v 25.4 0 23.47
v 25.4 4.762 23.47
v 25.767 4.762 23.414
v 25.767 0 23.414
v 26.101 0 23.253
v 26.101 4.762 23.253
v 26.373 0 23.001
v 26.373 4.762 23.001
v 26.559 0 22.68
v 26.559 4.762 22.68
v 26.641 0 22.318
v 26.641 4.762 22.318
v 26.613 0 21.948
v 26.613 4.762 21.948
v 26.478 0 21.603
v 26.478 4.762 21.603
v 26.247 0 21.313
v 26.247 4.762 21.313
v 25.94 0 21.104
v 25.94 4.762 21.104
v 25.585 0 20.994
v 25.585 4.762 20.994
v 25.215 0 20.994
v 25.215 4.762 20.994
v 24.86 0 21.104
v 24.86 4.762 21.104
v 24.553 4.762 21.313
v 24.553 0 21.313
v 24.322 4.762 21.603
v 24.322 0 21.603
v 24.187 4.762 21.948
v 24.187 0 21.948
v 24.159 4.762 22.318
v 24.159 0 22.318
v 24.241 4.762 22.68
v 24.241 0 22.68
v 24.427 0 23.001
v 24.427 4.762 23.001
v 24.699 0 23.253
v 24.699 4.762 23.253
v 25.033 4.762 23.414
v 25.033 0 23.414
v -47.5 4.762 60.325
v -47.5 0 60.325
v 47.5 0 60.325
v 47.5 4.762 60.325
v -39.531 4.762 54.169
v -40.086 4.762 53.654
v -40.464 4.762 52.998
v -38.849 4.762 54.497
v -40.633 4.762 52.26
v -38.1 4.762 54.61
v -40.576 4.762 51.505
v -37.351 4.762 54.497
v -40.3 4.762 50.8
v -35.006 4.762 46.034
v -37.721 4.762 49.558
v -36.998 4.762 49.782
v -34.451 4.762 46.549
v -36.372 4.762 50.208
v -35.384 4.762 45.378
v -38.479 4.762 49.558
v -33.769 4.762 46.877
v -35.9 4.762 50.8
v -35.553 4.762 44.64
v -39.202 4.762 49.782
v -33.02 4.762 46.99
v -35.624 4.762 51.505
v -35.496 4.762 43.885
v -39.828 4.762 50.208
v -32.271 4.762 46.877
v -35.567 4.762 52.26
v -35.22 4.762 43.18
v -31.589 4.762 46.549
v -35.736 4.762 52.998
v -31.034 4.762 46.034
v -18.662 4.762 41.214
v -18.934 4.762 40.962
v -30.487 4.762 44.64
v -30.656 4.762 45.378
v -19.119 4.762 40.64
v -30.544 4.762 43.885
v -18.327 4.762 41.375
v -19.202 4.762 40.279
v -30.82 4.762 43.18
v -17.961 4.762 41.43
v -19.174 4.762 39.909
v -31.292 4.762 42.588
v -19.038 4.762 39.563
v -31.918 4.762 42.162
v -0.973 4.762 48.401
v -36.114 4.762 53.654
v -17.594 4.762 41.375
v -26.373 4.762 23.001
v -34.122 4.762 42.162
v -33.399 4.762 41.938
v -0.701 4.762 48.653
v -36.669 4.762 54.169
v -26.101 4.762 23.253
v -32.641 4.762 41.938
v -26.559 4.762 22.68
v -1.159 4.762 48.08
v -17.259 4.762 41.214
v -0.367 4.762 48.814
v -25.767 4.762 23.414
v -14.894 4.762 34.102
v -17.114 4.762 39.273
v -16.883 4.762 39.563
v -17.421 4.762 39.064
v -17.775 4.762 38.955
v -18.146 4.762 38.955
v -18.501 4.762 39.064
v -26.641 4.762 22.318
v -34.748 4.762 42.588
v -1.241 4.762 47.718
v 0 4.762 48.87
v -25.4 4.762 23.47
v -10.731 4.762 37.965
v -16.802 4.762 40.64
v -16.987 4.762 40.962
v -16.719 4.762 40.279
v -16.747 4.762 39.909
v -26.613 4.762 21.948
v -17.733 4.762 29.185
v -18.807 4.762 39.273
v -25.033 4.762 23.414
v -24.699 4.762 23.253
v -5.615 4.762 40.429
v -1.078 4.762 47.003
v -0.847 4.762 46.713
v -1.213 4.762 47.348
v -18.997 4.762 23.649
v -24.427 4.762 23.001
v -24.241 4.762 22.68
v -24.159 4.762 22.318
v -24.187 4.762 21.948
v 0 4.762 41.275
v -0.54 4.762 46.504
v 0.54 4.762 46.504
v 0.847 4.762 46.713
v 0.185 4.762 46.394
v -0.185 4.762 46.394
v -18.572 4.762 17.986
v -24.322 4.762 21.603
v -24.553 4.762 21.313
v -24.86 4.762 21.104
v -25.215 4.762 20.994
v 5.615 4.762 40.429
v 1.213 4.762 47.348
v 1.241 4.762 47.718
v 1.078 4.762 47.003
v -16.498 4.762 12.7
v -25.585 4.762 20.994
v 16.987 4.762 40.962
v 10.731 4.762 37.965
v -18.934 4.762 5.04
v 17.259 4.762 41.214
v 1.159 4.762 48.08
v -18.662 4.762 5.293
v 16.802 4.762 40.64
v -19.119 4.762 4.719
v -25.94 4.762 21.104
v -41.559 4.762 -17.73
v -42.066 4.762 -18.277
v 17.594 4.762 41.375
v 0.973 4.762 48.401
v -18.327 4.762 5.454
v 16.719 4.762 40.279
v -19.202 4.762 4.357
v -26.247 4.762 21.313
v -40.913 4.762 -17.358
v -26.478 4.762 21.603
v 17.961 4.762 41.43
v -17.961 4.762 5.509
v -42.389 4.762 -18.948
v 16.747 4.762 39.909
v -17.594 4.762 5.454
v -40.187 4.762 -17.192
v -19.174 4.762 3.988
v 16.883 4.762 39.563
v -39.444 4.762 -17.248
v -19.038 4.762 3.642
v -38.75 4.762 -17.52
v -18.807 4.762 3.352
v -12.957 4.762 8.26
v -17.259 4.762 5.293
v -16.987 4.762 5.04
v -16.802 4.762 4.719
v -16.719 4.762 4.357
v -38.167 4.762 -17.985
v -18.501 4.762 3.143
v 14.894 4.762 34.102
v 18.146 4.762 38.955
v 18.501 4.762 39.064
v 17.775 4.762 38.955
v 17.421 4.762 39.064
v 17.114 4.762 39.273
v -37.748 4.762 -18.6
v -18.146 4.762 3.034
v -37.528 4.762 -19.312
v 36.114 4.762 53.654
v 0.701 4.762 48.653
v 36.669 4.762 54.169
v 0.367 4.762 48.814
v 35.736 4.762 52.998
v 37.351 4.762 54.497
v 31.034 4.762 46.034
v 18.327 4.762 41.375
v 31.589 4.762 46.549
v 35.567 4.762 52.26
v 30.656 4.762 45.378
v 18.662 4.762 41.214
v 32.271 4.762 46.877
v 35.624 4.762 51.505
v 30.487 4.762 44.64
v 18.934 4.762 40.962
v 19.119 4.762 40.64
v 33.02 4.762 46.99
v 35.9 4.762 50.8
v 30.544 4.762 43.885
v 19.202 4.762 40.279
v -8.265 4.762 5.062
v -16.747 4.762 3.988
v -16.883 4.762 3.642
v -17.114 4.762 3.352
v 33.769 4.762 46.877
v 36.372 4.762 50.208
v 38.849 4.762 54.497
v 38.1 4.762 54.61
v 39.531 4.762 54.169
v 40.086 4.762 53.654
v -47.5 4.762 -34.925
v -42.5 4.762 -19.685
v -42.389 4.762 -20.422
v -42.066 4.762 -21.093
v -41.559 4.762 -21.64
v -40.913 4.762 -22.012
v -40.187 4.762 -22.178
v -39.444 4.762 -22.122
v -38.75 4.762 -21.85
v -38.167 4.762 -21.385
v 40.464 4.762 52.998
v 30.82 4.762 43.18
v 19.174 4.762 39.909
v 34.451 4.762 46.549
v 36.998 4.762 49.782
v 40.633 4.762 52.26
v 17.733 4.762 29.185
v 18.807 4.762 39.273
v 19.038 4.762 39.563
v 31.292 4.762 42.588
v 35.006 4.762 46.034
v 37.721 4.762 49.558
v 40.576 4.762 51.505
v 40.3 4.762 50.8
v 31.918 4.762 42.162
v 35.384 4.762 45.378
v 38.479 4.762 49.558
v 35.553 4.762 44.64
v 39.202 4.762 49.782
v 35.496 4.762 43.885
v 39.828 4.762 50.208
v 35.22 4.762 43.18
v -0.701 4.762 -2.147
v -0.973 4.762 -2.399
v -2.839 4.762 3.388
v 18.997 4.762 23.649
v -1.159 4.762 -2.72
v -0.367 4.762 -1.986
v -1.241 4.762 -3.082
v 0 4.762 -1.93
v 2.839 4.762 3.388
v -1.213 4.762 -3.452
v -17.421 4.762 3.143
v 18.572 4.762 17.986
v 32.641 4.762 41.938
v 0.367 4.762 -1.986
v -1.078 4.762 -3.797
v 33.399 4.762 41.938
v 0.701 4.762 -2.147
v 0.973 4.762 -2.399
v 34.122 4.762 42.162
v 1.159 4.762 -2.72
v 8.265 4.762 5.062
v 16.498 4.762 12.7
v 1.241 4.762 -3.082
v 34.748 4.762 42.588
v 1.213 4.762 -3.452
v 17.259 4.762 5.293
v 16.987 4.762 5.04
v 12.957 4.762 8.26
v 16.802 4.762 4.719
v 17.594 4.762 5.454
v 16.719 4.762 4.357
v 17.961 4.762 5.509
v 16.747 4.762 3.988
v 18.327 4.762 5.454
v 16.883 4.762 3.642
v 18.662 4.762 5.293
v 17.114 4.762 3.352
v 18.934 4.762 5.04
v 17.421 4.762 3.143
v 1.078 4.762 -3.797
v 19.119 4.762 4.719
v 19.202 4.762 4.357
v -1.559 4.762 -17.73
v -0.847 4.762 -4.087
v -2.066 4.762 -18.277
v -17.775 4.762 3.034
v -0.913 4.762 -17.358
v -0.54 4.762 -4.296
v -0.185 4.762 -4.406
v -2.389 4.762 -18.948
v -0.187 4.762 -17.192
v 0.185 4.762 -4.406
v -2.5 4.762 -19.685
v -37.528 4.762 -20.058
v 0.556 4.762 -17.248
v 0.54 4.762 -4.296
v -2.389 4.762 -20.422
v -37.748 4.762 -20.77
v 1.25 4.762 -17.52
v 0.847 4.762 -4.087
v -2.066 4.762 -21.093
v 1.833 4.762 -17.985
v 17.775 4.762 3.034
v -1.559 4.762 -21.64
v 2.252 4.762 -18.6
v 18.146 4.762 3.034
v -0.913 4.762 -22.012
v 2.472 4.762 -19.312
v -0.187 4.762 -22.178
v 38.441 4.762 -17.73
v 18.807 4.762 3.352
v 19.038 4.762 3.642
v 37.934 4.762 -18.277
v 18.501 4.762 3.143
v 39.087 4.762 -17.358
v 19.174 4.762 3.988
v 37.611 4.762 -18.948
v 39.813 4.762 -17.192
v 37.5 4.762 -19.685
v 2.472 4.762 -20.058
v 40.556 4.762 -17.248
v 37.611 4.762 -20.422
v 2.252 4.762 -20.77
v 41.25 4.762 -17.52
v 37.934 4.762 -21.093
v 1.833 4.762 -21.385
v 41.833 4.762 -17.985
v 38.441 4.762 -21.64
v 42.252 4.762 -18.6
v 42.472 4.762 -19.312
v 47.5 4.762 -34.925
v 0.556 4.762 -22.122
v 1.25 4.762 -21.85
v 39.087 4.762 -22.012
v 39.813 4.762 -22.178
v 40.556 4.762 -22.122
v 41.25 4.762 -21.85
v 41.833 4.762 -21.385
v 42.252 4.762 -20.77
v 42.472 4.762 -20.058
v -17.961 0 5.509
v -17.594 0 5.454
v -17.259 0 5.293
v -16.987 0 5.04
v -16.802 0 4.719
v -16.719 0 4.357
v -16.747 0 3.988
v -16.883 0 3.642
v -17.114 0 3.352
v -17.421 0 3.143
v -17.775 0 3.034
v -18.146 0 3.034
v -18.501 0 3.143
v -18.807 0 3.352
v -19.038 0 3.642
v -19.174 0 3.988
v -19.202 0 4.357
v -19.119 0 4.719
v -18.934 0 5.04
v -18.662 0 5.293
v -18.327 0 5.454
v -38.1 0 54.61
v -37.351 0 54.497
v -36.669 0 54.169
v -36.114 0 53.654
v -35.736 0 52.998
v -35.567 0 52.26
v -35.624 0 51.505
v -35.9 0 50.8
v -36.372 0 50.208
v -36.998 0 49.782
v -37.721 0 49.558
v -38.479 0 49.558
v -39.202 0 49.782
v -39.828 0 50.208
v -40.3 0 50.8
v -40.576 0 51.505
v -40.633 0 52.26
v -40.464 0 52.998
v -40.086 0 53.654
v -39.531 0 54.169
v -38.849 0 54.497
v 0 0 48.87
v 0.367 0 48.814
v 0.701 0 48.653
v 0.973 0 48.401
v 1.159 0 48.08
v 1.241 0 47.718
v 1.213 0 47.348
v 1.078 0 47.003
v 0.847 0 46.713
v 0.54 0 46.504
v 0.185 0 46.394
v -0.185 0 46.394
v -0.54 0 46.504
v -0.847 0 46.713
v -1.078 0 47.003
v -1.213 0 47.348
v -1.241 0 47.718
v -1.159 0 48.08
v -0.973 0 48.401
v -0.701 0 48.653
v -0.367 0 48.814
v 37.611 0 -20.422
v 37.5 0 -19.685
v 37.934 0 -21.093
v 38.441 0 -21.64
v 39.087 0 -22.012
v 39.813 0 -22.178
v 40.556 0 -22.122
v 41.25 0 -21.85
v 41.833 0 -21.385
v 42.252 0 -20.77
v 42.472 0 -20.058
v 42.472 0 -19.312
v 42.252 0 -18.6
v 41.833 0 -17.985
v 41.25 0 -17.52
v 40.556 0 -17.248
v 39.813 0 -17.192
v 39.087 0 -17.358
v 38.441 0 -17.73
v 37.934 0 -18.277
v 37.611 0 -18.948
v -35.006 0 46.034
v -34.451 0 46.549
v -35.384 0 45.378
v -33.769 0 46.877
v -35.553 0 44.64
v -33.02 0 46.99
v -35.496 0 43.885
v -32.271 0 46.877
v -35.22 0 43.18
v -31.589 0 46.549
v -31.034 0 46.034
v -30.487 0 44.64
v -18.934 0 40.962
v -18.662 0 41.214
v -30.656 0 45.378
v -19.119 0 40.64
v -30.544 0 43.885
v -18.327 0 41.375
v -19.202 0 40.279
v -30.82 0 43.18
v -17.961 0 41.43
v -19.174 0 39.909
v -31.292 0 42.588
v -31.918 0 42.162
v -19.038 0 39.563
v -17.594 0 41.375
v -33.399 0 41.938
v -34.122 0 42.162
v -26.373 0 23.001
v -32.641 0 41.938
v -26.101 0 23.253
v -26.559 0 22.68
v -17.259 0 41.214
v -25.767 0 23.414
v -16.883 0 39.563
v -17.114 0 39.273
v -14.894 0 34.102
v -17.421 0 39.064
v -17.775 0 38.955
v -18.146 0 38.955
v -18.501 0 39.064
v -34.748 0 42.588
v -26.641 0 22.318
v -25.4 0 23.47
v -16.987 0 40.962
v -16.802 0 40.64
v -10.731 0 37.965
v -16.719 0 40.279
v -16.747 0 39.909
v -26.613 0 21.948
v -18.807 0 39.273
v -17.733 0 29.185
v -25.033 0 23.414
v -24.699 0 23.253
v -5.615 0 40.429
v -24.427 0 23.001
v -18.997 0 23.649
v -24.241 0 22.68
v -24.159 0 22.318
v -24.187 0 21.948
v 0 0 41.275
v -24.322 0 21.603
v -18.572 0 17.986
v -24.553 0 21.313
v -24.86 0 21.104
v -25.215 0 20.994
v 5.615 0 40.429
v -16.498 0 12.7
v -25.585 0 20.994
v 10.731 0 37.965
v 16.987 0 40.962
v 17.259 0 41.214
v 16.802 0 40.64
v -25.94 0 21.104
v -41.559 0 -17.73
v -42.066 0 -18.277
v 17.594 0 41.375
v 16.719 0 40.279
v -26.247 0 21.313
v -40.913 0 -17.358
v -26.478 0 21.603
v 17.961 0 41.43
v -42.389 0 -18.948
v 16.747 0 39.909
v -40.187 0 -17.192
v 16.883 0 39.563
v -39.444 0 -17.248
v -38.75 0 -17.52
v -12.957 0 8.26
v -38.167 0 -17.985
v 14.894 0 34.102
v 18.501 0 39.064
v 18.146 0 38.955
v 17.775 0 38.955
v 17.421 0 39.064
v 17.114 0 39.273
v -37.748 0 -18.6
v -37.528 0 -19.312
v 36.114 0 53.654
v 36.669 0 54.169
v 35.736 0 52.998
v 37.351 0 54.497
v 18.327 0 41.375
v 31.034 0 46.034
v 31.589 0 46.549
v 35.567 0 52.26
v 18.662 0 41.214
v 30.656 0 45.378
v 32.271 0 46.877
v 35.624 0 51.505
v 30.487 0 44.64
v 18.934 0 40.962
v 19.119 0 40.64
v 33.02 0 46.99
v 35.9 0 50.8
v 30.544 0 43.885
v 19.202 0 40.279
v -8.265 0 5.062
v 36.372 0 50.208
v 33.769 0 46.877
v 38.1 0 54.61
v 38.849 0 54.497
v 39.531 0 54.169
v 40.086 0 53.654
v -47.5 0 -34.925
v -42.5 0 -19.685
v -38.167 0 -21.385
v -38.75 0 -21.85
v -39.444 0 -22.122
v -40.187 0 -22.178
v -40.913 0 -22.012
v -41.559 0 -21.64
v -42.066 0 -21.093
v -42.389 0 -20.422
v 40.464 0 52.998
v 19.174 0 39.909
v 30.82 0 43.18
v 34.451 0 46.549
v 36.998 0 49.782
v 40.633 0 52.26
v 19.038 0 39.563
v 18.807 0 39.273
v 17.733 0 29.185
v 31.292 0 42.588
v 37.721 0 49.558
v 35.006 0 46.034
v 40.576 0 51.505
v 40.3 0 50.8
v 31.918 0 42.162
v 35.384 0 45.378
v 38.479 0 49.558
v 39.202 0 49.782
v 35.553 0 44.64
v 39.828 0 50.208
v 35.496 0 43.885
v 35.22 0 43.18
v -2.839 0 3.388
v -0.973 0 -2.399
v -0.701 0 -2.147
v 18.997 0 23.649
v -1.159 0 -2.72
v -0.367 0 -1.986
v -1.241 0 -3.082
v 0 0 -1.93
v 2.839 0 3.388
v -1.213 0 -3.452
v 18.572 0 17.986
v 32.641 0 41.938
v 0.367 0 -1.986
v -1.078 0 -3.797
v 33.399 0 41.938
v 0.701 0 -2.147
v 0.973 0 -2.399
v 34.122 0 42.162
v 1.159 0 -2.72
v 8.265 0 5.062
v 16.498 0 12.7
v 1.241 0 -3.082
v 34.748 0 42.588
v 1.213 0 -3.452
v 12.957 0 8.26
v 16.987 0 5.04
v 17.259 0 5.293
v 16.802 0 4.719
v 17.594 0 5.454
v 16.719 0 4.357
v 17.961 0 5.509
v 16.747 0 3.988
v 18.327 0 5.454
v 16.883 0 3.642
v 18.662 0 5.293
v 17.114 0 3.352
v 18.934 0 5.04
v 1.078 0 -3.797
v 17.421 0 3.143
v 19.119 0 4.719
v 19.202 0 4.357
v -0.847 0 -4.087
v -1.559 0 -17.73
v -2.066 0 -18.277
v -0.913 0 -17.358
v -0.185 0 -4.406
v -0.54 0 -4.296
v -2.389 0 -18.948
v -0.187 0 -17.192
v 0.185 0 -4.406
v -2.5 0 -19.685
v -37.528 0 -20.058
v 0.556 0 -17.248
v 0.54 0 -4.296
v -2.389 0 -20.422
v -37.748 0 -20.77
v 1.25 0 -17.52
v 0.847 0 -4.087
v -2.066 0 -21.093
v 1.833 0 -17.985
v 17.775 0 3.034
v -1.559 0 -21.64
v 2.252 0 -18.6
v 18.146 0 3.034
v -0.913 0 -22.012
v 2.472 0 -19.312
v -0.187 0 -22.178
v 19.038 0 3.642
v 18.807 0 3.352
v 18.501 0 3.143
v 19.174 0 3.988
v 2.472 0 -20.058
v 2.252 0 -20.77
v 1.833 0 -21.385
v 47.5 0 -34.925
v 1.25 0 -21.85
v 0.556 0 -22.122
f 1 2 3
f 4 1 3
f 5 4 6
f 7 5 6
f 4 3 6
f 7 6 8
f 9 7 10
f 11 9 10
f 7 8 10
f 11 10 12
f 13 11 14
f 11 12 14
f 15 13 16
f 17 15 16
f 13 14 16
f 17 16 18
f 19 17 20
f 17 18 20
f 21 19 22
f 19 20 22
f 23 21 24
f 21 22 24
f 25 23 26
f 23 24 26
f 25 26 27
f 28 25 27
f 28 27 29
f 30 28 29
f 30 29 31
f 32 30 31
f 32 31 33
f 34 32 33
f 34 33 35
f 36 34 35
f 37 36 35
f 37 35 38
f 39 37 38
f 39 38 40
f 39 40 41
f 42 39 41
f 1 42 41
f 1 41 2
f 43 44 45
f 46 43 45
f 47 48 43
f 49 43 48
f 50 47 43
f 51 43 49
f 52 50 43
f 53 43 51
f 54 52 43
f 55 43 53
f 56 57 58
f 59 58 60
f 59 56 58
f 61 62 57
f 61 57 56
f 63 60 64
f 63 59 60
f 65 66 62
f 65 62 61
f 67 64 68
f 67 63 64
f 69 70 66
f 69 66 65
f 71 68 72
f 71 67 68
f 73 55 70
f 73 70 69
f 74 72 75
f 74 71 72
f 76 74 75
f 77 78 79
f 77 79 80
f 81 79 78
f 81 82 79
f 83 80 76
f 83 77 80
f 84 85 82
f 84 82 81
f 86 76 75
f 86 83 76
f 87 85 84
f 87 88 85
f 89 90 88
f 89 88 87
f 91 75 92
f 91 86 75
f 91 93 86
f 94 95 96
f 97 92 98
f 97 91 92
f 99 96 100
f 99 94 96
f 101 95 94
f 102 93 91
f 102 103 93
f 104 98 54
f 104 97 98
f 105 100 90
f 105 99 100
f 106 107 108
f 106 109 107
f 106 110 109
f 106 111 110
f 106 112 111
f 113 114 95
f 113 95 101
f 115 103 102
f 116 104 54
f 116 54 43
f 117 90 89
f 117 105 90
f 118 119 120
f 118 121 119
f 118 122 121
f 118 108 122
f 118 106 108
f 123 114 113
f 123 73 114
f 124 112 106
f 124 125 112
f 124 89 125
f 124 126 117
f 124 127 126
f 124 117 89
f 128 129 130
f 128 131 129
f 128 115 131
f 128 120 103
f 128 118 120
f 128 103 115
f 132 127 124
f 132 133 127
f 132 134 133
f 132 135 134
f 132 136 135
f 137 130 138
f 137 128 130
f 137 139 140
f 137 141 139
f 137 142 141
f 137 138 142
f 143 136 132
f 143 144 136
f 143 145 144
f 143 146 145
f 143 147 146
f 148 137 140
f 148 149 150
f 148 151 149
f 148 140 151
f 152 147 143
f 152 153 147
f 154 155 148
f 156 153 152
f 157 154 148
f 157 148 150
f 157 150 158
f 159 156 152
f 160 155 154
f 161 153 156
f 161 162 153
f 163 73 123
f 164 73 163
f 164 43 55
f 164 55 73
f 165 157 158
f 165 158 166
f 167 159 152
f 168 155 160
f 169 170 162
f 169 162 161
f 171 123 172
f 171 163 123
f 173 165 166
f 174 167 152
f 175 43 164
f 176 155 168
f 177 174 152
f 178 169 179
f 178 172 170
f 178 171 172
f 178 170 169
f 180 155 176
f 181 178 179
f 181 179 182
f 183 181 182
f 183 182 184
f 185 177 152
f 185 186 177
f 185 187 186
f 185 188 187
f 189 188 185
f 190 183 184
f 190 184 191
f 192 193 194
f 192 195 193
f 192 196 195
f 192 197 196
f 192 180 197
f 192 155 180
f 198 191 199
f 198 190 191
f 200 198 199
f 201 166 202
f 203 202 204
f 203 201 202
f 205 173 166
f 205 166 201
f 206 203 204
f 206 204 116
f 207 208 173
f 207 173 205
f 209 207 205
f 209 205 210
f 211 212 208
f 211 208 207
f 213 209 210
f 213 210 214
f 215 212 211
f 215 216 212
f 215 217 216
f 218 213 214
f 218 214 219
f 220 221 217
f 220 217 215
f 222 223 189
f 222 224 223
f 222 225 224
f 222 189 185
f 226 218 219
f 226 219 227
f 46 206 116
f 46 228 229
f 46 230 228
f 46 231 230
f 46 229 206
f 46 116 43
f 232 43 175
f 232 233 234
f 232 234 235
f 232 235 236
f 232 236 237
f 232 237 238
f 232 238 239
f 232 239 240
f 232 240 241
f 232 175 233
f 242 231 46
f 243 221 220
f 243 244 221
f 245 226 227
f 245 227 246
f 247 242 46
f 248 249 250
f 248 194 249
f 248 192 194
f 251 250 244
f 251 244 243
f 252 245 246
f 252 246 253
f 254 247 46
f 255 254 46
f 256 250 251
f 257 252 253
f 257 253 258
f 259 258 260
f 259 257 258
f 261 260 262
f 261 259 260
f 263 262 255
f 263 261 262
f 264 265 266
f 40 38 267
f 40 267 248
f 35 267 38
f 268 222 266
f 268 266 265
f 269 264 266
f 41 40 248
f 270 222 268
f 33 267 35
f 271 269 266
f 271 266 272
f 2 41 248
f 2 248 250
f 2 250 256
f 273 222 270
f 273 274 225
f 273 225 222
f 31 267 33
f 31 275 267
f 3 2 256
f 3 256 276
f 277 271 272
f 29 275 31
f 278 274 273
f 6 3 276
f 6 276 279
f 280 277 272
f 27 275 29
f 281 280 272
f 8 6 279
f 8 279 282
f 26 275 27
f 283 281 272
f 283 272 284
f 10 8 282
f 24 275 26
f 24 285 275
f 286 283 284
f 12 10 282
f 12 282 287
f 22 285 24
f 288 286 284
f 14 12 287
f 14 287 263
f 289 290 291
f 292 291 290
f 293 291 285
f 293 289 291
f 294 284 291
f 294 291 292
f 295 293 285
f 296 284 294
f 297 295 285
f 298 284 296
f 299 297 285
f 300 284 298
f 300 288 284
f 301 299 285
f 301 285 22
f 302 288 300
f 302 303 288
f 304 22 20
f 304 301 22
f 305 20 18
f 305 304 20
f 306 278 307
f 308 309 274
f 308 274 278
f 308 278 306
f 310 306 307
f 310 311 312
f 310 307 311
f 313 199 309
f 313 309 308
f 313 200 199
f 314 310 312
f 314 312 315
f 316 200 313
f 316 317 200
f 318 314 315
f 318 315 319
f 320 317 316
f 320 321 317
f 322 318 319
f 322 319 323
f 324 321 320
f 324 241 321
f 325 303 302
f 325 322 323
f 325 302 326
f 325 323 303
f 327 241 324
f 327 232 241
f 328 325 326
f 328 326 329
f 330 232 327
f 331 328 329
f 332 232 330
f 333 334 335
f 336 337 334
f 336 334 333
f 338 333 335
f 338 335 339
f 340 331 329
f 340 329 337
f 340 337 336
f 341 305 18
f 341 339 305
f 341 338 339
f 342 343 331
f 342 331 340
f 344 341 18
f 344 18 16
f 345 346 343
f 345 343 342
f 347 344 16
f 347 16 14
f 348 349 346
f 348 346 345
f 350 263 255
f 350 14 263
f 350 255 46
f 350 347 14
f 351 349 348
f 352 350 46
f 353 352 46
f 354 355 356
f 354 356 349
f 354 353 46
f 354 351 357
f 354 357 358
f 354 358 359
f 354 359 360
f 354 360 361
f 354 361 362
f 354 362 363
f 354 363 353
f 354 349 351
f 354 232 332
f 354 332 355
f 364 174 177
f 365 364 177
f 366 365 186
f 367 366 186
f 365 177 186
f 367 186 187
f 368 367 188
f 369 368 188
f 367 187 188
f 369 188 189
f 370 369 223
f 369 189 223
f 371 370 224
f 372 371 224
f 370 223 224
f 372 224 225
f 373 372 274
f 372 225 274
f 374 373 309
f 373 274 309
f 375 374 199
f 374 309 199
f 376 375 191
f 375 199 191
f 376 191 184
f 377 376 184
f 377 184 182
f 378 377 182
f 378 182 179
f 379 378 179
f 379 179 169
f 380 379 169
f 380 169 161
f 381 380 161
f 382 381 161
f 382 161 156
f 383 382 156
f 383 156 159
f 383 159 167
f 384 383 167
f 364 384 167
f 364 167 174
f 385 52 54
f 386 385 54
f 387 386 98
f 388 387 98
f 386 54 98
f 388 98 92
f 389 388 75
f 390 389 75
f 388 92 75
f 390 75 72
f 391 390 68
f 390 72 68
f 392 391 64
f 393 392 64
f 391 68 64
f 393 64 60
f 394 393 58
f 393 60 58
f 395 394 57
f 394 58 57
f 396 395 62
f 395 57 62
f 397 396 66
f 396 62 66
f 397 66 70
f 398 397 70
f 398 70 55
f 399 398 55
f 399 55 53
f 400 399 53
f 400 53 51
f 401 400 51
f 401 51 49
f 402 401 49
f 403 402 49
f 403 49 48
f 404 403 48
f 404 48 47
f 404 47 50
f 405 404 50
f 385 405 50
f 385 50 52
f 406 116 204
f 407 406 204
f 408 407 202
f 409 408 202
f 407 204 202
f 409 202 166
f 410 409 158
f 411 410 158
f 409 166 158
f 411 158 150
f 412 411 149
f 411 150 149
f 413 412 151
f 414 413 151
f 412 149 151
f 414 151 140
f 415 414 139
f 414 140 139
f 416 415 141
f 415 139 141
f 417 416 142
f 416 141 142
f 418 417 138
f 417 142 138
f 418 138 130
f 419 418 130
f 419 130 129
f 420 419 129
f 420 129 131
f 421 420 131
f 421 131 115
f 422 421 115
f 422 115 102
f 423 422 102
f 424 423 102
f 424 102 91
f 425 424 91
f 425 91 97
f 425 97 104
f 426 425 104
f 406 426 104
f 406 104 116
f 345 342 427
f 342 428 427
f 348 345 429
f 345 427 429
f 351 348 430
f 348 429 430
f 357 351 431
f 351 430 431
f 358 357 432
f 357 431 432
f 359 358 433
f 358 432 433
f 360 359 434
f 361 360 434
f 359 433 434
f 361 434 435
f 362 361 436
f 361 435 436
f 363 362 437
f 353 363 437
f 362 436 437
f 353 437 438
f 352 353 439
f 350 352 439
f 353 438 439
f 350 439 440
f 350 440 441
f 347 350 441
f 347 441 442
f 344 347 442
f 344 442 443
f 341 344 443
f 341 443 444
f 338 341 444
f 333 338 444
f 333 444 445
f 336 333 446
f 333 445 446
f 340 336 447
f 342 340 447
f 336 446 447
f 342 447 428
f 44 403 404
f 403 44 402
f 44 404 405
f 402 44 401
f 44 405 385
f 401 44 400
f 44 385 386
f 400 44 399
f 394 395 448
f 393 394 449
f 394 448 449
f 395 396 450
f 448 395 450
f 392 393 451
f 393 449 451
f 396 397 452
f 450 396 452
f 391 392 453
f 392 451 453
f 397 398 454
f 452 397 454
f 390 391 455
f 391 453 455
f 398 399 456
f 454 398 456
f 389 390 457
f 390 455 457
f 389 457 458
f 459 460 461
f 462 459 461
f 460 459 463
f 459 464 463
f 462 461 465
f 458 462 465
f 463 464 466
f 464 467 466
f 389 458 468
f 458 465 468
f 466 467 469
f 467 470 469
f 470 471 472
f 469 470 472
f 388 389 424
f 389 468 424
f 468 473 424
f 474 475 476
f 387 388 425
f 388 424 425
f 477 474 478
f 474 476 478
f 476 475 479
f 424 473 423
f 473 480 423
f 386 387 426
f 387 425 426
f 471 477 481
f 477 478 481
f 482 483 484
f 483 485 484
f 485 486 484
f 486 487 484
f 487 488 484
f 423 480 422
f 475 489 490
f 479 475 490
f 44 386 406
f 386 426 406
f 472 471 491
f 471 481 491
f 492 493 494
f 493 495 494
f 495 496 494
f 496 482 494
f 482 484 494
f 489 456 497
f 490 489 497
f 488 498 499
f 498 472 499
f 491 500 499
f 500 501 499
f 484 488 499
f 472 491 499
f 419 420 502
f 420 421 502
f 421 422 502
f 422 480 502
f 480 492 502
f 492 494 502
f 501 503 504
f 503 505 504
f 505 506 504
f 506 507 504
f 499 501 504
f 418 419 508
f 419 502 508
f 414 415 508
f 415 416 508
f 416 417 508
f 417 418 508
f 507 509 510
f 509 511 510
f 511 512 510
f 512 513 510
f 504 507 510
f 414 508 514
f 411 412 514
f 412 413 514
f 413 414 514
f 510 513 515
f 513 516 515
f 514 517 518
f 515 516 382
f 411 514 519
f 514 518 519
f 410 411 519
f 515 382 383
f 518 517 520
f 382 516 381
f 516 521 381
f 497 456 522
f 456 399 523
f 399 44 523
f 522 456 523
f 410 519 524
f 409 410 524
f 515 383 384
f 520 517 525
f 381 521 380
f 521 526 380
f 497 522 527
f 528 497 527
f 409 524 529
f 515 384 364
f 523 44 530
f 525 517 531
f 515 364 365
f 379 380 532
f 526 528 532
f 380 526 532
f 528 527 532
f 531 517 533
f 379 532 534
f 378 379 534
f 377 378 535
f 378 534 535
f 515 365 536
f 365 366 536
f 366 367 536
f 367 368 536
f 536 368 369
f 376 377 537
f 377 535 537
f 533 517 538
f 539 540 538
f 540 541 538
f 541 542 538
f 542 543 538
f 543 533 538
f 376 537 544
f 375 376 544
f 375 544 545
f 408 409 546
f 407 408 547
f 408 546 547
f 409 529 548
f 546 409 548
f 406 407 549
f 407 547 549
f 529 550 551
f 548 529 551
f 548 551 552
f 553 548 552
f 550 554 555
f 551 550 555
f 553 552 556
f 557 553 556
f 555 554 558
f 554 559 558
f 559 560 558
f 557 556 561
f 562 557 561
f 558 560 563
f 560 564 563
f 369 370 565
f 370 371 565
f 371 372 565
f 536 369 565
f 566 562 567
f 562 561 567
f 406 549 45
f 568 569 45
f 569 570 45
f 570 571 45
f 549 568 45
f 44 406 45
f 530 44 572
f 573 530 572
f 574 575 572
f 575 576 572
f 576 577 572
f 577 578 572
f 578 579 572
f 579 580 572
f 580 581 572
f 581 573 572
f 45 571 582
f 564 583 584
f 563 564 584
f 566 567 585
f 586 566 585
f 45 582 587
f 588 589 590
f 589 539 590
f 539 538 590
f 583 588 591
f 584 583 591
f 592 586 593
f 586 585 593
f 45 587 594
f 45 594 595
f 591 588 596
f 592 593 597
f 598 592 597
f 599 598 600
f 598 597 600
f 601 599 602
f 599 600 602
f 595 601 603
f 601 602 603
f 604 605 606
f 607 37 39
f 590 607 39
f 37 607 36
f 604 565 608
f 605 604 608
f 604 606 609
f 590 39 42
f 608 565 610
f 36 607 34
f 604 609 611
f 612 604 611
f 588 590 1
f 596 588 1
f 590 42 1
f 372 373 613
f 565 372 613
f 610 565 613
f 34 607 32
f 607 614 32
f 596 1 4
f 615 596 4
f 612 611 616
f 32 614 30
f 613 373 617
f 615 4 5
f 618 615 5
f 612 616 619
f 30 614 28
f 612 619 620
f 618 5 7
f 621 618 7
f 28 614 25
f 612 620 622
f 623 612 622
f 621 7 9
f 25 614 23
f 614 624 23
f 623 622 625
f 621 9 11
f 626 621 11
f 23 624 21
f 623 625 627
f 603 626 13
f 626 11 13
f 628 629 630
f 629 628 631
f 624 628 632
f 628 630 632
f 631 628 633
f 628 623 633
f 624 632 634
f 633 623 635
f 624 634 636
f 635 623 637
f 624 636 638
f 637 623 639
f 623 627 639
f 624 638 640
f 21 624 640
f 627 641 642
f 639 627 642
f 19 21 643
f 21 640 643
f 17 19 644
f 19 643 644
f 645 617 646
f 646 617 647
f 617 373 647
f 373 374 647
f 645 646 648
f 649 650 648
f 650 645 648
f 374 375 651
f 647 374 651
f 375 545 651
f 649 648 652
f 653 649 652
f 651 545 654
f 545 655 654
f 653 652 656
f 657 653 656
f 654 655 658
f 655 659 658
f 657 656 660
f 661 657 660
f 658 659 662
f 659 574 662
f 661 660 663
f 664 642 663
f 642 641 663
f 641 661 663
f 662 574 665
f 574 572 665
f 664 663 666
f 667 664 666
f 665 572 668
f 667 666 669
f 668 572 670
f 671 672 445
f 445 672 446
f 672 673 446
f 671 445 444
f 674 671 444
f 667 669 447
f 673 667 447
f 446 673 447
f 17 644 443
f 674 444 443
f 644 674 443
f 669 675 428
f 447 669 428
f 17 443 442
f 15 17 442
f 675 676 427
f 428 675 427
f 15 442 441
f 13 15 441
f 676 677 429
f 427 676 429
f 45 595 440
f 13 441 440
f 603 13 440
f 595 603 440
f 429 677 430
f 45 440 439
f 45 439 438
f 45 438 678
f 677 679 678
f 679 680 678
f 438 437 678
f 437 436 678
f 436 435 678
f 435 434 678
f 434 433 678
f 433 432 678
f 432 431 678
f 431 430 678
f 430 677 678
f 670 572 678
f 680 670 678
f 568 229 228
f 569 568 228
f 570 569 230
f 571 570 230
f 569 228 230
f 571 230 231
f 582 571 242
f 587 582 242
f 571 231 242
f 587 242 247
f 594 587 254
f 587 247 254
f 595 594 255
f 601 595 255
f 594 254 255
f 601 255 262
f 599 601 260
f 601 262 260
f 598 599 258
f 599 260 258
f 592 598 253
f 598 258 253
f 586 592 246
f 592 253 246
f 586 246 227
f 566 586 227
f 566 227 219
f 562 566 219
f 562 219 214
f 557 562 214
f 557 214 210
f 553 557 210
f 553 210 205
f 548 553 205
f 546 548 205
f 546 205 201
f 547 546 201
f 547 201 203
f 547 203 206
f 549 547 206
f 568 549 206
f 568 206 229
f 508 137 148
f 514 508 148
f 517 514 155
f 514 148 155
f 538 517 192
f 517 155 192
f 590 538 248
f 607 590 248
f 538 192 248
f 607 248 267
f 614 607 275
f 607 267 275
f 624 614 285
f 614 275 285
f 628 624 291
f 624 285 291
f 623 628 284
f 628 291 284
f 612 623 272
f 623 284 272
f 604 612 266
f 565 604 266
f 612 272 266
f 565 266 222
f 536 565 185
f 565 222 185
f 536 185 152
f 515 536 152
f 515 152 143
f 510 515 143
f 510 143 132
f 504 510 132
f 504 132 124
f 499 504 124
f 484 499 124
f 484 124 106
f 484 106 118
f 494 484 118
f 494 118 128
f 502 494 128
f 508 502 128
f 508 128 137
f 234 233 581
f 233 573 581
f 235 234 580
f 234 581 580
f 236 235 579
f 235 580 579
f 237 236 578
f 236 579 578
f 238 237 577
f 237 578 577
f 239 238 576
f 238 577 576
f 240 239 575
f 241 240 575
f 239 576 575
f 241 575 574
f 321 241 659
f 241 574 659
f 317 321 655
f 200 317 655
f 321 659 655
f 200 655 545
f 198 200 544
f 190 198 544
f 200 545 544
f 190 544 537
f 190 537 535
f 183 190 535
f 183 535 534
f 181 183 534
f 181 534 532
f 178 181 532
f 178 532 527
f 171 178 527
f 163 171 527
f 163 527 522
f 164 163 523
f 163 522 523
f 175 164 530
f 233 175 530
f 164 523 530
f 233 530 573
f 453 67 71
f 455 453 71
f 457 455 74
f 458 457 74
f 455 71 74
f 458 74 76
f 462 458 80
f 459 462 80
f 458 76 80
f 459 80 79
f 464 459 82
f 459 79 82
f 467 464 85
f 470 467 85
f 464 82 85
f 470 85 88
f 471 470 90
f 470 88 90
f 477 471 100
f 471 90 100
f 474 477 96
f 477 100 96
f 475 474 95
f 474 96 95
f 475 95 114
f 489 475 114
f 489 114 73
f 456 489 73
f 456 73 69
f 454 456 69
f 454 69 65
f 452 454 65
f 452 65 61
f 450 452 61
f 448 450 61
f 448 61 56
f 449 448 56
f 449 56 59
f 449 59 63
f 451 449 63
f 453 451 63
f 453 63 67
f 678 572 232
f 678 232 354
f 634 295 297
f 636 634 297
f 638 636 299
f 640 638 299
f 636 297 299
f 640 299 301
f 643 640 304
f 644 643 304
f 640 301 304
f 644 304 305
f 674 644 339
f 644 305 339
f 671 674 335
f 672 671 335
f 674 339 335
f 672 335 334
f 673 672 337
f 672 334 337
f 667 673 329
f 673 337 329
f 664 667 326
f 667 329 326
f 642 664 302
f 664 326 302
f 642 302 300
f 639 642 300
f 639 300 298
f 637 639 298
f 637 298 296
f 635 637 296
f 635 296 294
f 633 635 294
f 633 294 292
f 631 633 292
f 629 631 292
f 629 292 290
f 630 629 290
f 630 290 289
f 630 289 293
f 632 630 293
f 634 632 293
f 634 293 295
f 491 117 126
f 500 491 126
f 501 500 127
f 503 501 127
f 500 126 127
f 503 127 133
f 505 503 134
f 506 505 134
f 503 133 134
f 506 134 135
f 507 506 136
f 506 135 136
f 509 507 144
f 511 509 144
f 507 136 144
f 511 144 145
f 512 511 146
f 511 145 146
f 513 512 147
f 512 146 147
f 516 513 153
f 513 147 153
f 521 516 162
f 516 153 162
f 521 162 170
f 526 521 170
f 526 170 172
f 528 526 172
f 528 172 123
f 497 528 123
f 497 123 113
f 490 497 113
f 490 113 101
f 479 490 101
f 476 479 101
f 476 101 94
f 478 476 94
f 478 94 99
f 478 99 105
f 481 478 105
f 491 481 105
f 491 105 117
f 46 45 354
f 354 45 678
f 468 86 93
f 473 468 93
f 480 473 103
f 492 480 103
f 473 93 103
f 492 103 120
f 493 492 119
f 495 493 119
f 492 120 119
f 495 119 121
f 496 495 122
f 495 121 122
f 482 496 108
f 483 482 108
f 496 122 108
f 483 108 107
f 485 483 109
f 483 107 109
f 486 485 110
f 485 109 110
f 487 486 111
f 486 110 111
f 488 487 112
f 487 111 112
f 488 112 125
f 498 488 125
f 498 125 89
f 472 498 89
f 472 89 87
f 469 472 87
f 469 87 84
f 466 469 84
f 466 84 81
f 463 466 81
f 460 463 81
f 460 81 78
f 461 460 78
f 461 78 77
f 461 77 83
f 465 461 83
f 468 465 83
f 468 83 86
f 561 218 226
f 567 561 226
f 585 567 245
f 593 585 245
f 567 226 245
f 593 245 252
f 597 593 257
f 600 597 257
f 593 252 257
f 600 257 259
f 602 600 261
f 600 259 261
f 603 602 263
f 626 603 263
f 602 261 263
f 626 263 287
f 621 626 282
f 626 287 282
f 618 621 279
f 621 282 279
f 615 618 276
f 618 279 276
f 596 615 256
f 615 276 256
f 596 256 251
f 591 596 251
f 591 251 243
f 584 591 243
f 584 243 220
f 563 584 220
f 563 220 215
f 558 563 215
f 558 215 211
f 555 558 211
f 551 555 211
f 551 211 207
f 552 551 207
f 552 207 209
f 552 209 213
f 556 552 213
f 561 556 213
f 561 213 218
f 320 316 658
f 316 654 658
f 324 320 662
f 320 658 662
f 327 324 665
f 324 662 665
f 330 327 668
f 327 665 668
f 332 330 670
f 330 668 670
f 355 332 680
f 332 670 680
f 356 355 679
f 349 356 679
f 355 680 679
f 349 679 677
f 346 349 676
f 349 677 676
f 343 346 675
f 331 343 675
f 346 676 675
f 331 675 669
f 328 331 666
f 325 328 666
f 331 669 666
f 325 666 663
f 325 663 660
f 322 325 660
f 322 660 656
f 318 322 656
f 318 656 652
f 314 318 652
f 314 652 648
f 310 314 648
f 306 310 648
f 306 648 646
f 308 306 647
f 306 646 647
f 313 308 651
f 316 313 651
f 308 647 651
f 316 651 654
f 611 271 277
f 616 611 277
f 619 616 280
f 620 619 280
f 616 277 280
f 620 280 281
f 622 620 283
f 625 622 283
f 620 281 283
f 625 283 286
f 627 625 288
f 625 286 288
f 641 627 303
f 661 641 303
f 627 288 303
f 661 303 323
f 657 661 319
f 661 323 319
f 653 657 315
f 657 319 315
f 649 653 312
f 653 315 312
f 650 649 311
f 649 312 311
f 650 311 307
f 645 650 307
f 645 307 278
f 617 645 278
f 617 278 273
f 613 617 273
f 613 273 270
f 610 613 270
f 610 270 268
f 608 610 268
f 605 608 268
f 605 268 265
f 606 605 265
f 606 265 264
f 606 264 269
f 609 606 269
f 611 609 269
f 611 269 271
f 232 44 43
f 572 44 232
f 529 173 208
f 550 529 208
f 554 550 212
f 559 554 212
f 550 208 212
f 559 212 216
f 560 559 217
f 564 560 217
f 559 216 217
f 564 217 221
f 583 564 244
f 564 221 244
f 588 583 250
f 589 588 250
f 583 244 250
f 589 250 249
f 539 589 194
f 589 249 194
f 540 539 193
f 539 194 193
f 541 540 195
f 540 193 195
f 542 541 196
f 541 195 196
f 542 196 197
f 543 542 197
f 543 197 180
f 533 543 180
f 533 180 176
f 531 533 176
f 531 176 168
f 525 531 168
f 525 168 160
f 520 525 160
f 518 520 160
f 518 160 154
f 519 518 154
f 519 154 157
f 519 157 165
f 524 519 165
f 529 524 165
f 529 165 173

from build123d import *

# Parameters (mm, degrees)
SKETCH2_W                 = 95
SKETCH2_H                 = 95.25
BOSS_EXTRUDE3_DEPTH       = 4.7625
SKETCH3_R                 = 19.05
CUT_EXTRUDE1_DEPTH        = 77.928778953
M6X1_0_TAPPED_HOLE1_D     = 5
M6X1_0_TAPPED_HOLE1_DEPTH = 4.7625
M6X1_0_TAPPED_HOLE1_TIP   = 1.502151548
SKETCH7_R                 = 2.54
CUT_EXTRUDE2_DEPTH        = 7.62
SKETCH12_R                = 1.2446
CUT_EXTRUDE3_DEPTH        = 77.928778953


with BuildPart() as part:
    # Sketch2 → Boss-Extrude3 (new body)
    with BuildSketch(Plane(origin=(0, 0, 0), x_dir=(1, 0, 0), z_dir=(0, 1, 0))):
        with Locations((0, -12.7)):
            Rectangle(SKETCH2_W, SKETCH2_H)
    extrude(amount=BOSS_EXTRUDE3_DEPTH)

    # Sketch3 → Cut-Extrude1 (cut, through all)
    with BuildSketch(Plane(origin=(0, 4.7625, 0), x_dir=(1, 0, 0), z_dir=(0, 1, 0))):
        with Locations(Location((0, -22.225, 0), (0, 0, 270))):
            Circle(SKETCH3_R)
    extrude(amount=-CUT_EXTRUDE1_DEPTH, mode=Mode.SUBTRACT)

    # M6x1.0 Tapped Hole1
    with Locations(Plane(origin=(0, 4.7625, 0), x_dir=(1, 0, 0), z_dir=(0, 1, 0))):
        with Locations((-40, 19.685), (40, 19.685), (0, 19.685)):
            Hole(M6X1_0_TAPPED_HOLE1_D / 2, depth=M6X1_0_TAPPED_HOLE1_DEPTH)
            with Locations((0, 0, -(M6X1_0_TAPPED_HOLE1_DEPTH + M6X1_0_TAPPED_HOLE1_TIP / 2))):  # 118° drill point
                Cone(0, M6X1_0_TAPPED_HOLE1_D / 2, M6X1_0_TAPPED_HOLE1_TIP, mode=Mode.SUBTRACT)

    # Sketch7 → Cut-Extrude2 (cut)
    with BuildSketch(Plane(origin=(0, 4.7625, 0), x_dir=(1, 0, 0), z_dir=(0, 1, 0))):
        with Locations(Location((-33.02, -44.45, 0), (0, 0, 270))):
            Circle(SKETCH7_R)
        with Locations(Location((33.02, -44.45, 0), (0, 0, 270))):
            Circle(SKETCH7_R)
        with Locations(Location((-38.1, -52.07, 0), (0, 0, 270))):
            Circle(SKETCH7_R)
        with Locations(Location((38.1, -52.07, 0), (0, 0, 270))):
            Circle(SKETCH7_R)
    extrude(amount=-CUT_EXTRUDE2_DEPTH, mode=Mode.SUBTRACT)

    # Sketch12 → Cut-Extrude3 (cut, through all)
    with BuildSketch(Plane(origin=(0, 4.7625, 0), x_dir=(1, 0, 0), z_dir=(0, 1, 0))):
        with Locations(Location((0, 3.175, 0), (0, 0, 270))):
            Circle(SKETCH12_R)
        with Locations(Location((17.960512242, -4.264487758, 0), (0, 0, 270))):
            Circle(SKETCH12_R)
        with Locations(Location((25.4, -22.225, 0), (0, 0, 270))):
            Circle(SKETCH12_R)
        with Locations(Location((17.960512242, -40.185512242, 0), (0, 0, 270))):
            Circle(SKETCH12_R)
        with Locations(Location((0, -47.625, 0), (0, 0, 270))):
            Circle(SKETCH12_R)
        with Locations(Location((-17.960512242, -40.185512242, 0), (0, 0, 270))):
            Circle(SKETCH12_R)
        with Locations(Location((-25.4, -22.225, 0), (0, 0, 270))):
            Circle(SKETCH12_R)
        with Locations(Location((-17.960512242, -4.264487758, 0), (0, 0, 270))):
            Circle(SKETCH12_R)
    extrude(amount=-CUT_EXTRUDE3_DEPTH, mode=Mode.SUBTRACT)


solid = part.part
